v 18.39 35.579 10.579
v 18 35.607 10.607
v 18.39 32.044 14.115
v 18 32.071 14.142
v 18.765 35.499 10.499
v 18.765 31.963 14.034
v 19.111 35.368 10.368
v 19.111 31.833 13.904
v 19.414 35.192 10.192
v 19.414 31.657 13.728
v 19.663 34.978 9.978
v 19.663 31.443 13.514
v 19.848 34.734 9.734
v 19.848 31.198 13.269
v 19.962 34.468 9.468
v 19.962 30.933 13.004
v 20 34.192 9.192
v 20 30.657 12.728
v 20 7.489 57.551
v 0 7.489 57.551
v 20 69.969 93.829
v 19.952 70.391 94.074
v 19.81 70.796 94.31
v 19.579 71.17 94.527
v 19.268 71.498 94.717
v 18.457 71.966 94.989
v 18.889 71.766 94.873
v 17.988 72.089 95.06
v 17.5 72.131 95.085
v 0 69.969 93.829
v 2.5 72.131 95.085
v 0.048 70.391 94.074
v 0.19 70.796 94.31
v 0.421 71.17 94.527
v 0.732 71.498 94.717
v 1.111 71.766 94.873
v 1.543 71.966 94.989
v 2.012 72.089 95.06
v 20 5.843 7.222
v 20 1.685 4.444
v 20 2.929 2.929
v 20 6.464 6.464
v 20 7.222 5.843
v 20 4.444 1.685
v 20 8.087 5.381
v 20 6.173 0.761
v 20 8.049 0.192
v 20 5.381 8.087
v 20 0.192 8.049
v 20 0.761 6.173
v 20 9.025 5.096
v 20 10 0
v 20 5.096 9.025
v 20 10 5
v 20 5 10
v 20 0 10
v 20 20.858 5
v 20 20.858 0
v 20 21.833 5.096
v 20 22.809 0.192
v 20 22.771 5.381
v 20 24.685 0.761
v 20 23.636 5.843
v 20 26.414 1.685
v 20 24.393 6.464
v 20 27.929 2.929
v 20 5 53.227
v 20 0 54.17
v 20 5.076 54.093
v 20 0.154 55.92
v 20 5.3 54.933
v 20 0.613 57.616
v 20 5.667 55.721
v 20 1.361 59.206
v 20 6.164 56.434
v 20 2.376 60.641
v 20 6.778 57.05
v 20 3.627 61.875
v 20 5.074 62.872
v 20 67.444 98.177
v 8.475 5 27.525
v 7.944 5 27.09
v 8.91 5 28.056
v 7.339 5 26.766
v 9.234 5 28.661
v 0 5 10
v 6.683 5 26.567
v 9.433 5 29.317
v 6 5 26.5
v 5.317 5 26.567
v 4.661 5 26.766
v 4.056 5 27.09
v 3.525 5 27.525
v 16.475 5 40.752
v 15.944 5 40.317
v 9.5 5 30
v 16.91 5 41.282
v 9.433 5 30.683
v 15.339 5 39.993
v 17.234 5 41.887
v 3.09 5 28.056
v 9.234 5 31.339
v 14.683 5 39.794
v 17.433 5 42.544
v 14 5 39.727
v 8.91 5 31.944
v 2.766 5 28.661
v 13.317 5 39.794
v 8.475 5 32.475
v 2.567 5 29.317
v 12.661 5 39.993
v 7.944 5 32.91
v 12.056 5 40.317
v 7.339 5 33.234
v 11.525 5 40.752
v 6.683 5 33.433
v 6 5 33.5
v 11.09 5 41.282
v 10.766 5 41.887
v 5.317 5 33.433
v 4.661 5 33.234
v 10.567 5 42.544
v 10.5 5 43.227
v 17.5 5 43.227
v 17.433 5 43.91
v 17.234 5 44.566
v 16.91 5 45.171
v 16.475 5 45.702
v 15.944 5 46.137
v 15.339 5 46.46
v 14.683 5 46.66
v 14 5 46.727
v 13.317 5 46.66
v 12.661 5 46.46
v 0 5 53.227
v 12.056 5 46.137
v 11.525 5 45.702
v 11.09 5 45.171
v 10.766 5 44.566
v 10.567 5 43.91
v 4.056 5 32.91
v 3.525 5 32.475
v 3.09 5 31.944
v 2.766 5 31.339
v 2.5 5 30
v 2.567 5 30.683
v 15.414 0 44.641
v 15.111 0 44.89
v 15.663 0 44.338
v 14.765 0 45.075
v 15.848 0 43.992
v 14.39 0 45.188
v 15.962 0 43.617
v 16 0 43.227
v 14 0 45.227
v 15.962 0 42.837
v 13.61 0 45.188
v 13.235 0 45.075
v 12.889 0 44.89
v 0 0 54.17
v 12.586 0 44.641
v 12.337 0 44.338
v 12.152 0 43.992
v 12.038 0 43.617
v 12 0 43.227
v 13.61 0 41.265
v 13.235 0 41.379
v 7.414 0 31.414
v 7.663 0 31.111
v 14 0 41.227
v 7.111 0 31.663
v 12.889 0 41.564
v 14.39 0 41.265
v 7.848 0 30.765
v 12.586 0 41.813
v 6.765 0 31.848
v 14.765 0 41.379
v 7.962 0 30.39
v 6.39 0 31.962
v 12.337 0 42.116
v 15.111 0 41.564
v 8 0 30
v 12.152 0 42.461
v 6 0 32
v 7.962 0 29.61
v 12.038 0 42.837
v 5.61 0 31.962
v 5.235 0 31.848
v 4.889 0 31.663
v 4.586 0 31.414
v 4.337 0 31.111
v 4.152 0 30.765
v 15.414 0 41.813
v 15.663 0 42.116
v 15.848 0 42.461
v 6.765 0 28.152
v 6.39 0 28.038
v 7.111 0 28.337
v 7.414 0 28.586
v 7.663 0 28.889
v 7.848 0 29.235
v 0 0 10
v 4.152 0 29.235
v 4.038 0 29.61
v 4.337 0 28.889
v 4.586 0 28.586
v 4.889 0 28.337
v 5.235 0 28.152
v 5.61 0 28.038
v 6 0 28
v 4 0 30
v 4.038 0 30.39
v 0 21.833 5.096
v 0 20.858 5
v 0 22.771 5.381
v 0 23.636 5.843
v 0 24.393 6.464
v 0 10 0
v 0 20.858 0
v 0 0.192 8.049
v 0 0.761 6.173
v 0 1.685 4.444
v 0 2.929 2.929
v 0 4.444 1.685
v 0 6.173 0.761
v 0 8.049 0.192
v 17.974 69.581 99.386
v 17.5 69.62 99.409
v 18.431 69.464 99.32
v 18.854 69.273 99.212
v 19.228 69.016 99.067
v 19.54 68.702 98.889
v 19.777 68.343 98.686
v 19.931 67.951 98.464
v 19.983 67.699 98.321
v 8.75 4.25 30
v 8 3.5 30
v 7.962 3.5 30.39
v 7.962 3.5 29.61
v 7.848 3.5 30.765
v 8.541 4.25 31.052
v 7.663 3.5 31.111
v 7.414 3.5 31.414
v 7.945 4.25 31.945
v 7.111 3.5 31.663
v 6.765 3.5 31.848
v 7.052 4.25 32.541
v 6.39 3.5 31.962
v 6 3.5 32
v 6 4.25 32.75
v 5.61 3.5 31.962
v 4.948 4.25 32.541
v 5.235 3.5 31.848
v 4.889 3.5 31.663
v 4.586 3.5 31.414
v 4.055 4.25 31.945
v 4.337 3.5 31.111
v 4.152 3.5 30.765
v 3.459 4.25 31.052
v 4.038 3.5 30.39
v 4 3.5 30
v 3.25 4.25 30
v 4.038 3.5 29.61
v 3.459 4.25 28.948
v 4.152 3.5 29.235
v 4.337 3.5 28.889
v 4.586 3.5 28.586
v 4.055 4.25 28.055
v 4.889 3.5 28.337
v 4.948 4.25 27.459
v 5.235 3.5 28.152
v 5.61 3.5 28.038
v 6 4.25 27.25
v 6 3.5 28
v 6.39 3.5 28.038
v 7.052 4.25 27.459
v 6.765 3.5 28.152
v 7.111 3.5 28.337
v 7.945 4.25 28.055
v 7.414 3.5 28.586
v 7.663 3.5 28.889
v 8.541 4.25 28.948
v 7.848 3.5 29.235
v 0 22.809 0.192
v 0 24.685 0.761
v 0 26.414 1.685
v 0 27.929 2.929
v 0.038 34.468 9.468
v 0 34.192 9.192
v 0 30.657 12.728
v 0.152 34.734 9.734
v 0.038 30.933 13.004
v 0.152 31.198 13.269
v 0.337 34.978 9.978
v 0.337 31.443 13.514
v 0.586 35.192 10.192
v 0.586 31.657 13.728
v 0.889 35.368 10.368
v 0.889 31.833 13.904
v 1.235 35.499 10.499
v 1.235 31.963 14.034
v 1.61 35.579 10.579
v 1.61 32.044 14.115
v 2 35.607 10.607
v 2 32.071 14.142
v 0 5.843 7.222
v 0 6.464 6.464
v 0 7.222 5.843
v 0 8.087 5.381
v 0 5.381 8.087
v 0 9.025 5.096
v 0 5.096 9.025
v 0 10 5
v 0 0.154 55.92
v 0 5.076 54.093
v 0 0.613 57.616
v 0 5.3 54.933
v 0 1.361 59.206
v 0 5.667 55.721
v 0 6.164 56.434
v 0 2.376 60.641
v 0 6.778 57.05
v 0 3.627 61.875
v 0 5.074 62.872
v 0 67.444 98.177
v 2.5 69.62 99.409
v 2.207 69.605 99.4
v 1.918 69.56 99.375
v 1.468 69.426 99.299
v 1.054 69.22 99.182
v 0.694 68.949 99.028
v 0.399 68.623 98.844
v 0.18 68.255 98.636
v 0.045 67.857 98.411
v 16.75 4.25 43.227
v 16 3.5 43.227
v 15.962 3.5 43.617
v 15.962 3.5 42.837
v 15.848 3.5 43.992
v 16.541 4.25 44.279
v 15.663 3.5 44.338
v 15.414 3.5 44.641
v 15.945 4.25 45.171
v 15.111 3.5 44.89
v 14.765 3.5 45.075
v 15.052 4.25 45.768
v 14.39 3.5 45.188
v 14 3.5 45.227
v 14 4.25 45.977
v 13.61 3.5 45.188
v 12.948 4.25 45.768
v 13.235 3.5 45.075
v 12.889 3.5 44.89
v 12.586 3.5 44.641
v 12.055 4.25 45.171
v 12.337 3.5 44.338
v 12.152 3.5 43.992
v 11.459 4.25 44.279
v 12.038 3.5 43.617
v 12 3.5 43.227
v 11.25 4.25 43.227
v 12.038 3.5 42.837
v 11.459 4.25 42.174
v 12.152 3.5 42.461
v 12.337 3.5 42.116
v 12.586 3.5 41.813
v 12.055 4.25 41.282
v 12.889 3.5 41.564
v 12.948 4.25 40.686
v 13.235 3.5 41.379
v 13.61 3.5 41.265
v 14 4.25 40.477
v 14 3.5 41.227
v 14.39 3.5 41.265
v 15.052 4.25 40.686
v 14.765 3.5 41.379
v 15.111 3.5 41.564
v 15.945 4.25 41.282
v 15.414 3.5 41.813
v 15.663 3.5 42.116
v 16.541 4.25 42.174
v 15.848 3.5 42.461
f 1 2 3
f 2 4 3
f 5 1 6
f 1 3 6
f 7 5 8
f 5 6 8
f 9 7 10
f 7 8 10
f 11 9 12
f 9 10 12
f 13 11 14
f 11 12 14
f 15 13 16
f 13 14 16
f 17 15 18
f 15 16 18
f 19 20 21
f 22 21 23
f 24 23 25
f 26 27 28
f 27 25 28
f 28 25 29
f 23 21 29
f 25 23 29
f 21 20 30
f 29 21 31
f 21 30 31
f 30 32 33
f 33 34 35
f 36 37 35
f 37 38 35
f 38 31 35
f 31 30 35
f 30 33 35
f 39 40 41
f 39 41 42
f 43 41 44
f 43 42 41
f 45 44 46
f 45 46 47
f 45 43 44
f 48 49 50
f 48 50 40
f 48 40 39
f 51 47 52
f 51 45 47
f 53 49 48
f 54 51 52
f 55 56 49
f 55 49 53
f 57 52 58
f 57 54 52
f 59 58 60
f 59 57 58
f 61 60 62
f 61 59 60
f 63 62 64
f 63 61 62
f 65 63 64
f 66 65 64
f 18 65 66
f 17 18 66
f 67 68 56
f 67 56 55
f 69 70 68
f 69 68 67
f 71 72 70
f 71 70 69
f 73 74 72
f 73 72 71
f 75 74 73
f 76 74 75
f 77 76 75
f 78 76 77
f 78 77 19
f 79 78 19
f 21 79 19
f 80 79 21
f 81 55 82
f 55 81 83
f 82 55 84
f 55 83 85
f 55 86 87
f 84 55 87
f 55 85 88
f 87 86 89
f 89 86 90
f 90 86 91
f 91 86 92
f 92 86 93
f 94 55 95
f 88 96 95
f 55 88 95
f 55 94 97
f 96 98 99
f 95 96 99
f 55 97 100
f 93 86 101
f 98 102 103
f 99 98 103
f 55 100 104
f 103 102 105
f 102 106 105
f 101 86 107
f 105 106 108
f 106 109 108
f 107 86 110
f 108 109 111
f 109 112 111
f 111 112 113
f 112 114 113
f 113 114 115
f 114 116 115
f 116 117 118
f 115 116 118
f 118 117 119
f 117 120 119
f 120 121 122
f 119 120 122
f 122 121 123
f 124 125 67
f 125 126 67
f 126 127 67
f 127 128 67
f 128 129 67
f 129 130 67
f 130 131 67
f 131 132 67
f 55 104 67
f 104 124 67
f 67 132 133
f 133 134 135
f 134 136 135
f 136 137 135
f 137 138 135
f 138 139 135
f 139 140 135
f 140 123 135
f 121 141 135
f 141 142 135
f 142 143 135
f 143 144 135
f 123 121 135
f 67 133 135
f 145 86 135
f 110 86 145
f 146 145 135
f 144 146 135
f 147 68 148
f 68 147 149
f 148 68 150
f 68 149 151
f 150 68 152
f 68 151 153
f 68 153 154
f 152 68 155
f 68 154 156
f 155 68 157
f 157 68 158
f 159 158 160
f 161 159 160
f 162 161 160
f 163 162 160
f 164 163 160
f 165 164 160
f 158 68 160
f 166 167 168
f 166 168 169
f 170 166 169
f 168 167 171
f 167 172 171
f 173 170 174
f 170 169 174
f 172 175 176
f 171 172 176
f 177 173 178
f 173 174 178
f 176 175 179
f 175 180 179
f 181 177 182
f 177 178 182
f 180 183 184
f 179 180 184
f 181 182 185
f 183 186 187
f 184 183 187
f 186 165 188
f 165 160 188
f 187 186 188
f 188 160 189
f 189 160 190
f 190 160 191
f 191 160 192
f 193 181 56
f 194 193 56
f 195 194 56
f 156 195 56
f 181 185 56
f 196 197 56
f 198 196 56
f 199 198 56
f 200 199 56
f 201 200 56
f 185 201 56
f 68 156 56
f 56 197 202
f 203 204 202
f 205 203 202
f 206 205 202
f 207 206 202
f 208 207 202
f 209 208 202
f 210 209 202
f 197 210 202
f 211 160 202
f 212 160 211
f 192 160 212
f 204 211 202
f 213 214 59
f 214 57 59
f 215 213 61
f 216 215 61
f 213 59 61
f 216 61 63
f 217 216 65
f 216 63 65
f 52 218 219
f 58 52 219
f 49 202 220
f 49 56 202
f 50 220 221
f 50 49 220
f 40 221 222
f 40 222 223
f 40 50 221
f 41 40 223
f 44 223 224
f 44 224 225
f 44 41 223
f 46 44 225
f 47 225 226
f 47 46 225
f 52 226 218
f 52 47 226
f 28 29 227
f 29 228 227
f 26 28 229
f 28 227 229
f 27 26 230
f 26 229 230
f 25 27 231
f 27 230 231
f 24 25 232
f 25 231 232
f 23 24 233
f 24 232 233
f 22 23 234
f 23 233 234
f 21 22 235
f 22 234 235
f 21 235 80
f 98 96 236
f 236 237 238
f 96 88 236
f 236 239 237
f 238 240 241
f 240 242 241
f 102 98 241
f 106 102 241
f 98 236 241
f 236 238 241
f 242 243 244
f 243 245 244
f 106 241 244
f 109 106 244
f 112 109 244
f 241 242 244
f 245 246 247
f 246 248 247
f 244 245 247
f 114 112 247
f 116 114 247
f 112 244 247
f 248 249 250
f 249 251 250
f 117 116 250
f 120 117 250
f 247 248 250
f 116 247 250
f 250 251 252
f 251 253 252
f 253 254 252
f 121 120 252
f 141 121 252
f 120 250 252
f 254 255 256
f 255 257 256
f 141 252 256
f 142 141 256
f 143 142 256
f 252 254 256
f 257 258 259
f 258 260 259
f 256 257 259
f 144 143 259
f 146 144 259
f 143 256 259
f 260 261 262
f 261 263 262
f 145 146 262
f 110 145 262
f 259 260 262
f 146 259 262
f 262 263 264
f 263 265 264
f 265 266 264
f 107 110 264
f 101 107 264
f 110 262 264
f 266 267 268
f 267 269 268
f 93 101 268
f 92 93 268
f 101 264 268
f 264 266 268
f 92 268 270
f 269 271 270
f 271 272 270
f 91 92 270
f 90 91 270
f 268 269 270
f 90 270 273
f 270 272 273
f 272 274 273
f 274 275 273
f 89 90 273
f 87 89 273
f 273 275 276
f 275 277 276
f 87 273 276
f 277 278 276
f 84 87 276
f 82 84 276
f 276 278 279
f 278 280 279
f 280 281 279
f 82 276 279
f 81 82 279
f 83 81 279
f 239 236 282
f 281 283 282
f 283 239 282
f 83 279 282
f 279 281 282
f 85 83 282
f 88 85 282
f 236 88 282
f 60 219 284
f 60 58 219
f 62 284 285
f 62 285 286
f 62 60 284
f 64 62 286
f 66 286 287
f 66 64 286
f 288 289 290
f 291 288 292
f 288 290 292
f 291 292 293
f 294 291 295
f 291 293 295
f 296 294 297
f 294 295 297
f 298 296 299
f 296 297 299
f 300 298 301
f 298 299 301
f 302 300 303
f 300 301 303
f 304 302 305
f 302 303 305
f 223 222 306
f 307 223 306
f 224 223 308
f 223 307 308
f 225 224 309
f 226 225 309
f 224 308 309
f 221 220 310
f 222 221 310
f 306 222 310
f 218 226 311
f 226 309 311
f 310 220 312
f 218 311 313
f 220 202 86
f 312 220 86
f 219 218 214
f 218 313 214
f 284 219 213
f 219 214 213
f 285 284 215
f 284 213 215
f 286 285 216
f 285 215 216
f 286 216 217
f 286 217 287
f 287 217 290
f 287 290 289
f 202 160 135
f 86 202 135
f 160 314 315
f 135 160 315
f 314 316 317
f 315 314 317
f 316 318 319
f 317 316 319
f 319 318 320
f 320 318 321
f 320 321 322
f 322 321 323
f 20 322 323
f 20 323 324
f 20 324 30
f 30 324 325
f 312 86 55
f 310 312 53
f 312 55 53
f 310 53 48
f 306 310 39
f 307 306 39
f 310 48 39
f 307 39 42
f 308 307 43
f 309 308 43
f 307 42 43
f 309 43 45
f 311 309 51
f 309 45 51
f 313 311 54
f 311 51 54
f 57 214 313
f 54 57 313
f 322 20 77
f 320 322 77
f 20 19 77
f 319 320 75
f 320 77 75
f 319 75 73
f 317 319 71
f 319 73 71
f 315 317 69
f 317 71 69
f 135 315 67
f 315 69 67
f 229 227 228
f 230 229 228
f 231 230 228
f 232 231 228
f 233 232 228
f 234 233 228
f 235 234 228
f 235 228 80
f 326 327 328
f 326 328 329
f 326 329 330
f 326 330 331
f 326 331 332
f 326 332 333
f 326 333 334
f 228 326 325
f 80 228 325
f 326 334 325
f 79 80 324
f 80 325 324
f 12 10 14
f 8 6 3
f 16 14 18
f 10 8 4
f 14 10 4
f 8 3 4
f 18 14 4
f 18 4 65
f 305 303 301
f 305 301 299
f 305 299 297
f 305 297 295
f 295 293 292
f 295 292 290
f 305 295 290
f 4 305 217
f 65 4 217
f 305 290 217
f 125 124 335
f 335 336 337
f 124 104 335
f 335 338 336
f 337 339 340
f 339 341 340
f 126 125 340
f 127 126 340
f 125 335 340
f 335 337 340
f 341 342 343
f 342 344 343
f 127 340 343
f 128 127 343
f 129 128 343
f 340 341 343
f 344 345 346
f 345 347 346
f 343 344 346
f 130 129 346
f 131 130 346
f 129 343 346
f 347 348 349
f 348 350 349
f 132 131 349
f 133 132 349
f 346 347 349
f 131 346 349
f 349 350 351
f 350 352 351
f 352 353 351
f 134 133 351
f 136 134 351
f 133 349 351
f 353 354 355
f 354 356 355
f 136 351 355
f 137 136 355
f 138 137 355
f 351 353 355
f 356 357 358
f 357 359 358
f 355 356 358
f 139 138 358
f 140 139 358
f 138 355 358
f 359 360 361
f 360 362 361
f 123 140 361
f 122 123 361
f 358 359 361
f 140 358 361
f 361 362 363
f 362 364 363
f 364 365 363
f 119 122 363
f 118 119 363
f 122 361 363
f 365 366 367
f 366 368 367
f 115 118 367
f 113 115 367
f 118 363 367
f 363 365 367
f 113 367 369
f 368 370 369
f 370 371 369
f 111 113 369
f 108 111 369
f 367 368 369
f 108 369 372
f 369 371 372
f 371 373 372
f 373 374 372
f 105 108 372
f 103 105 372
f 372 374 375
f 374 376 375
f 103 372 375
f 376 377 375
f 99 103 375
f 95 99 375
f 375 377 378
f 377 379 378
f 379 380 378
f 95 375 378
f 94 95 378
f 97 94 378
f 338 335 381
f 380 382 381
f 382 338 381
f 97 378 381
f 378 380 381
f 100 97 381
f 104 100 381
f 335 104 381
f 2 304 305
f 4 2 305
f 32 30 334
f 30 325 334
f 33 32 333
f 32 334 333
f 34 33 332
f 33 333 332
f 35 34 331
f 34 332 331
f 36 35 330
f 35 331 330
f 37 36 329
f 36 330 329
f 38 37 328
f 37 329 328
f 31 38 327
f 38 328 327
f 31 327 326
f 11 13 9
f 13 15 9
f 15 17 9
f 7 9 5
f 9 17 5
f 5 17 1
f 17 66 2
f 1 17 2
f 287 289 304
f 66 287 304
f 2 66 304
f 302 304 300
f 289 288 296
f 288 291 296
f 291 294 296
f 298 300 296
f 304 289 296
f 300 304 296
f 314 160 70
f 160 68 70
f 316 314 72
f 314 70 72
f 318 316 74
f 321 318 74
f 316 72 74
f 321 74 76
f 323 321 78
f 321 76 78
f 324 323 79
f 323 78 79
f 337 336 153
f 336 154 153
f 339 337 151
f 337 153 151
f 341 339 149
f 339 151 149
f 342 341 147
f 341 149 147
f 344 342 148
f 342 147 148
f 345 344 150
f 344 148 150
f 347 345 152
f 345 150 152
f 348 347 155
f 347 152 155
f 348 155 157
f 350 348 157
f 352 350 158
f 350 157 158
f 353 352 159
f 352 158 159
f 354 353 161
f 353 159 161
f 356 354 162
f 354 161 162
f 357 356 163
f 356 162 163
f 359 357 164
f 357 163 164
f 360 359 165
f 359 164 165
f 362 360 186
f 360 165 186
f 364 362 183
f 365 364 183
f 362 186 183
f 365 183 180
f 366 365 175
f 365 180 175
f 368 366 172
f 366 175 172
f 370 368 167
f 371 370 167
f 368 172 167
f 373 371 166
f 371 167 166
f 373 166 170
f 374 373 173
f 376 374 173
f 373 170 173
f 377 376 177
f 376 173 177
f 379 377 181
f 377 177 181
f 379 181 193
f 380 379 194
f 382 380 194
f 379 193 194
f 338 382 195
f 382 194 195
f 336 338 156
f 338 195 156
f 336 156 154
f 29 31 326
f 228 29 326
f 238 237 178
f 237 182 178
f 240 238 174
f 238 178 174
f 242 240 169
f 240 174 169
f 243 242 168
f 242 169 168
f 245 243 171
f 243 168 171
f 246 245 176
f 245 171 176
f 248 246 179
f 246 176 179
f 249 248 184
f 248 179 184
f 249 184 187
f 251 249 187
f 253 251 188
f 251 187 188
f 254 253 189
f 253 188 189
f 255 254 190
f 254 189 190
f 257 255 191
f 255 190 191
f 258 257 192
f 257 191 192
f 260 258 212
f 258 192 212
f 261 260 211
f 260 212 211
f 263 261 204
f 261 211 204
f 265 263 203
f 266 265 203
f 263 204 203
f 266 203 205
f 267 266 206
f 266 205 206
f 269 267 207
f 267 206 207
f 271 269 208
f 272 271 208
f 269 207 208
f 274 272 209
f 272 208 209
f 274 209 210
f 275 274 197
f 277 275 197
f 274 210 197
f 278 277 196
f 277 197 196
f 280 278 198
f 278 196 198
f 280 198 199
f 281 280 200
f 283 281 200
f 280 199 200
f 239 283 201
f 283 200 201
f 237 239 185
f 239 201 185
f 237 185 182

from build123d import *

# Parameters (mm, degrees)
F1_DEPTH       = 20
F2_R           = 10
F3_R           = 5
F4_R           = 5
F5_R           = 2
F6_R           = 2.5
F8_D           = 4
F8_CSINK_D     = 7
F8_CSINK_ANGLE = 90


with BuildPart() as f1:
    # F0 (on Right) → F1 (new body)
    with BuildSketch(Plane.YZ):
        Polygon((0, 60), (0, 0), (25, 0), (35.606602, 10.606602), (32.071068, 14.142136), (22.928932, 5), (5, 5), (5, 56.105373), (72.130849, 95.084579), (69.620171, 99.408524), align=None)
    extrude(amount=F1_DEPTH)

    # F2
    f2_edges = [f1.edges().sort_by_distance(p)[0] for p in [
        (10, 0, 60),
        (10, 0, 0),
        (10, 25, 0),
    ]]
    fillet(f2_edges, radius=F2_R)

    # F3
    f3_edges = [f1.edges().sort_by_distance(p)[0] for p in [
        (10, 5, 56.105373),
        (10, 5, 5),
    ]]
    fillet(f3_edges, radius=F3_R)

    # F4
    f4_edges = [f1.edges().sort_by_distance(p)[0] for p in [
        (10, 22.928932, 5),
    ]]
    fillet(f4_edges, radius=F4_R)

    # F5
    f5_edges = [f1.edges().sort_by_distance(p)[0] for p in [
        (20, 33.838835, 12.374369),
        (0, 33.838835, 12.374369),
    ]]
    fillet(f5_edges, radius=F5_R)

    # F6
    f6_edges = [f1.edges().sort_by_distance(p)[0] for p in [
        (20, 70.87551, 97.246551),
        (0, 70.87551, 97.246551),
    ]]
    fillet(f6_edges, radius=F6_R)

    # F8 (through all)
    with Locations(Plane(origin=(0, 5, 0), x_dir=(-1, 0, 0), z_dir=(0, 1, 0))):
        with Locations((-6, 30), (-14, 43.226842)):
            CounterSinkHole(F8_D / 2, F8_CSINK_D / 2, counter_sink_angle=F8_CSINK_ANGLE)


solid = f1.part
